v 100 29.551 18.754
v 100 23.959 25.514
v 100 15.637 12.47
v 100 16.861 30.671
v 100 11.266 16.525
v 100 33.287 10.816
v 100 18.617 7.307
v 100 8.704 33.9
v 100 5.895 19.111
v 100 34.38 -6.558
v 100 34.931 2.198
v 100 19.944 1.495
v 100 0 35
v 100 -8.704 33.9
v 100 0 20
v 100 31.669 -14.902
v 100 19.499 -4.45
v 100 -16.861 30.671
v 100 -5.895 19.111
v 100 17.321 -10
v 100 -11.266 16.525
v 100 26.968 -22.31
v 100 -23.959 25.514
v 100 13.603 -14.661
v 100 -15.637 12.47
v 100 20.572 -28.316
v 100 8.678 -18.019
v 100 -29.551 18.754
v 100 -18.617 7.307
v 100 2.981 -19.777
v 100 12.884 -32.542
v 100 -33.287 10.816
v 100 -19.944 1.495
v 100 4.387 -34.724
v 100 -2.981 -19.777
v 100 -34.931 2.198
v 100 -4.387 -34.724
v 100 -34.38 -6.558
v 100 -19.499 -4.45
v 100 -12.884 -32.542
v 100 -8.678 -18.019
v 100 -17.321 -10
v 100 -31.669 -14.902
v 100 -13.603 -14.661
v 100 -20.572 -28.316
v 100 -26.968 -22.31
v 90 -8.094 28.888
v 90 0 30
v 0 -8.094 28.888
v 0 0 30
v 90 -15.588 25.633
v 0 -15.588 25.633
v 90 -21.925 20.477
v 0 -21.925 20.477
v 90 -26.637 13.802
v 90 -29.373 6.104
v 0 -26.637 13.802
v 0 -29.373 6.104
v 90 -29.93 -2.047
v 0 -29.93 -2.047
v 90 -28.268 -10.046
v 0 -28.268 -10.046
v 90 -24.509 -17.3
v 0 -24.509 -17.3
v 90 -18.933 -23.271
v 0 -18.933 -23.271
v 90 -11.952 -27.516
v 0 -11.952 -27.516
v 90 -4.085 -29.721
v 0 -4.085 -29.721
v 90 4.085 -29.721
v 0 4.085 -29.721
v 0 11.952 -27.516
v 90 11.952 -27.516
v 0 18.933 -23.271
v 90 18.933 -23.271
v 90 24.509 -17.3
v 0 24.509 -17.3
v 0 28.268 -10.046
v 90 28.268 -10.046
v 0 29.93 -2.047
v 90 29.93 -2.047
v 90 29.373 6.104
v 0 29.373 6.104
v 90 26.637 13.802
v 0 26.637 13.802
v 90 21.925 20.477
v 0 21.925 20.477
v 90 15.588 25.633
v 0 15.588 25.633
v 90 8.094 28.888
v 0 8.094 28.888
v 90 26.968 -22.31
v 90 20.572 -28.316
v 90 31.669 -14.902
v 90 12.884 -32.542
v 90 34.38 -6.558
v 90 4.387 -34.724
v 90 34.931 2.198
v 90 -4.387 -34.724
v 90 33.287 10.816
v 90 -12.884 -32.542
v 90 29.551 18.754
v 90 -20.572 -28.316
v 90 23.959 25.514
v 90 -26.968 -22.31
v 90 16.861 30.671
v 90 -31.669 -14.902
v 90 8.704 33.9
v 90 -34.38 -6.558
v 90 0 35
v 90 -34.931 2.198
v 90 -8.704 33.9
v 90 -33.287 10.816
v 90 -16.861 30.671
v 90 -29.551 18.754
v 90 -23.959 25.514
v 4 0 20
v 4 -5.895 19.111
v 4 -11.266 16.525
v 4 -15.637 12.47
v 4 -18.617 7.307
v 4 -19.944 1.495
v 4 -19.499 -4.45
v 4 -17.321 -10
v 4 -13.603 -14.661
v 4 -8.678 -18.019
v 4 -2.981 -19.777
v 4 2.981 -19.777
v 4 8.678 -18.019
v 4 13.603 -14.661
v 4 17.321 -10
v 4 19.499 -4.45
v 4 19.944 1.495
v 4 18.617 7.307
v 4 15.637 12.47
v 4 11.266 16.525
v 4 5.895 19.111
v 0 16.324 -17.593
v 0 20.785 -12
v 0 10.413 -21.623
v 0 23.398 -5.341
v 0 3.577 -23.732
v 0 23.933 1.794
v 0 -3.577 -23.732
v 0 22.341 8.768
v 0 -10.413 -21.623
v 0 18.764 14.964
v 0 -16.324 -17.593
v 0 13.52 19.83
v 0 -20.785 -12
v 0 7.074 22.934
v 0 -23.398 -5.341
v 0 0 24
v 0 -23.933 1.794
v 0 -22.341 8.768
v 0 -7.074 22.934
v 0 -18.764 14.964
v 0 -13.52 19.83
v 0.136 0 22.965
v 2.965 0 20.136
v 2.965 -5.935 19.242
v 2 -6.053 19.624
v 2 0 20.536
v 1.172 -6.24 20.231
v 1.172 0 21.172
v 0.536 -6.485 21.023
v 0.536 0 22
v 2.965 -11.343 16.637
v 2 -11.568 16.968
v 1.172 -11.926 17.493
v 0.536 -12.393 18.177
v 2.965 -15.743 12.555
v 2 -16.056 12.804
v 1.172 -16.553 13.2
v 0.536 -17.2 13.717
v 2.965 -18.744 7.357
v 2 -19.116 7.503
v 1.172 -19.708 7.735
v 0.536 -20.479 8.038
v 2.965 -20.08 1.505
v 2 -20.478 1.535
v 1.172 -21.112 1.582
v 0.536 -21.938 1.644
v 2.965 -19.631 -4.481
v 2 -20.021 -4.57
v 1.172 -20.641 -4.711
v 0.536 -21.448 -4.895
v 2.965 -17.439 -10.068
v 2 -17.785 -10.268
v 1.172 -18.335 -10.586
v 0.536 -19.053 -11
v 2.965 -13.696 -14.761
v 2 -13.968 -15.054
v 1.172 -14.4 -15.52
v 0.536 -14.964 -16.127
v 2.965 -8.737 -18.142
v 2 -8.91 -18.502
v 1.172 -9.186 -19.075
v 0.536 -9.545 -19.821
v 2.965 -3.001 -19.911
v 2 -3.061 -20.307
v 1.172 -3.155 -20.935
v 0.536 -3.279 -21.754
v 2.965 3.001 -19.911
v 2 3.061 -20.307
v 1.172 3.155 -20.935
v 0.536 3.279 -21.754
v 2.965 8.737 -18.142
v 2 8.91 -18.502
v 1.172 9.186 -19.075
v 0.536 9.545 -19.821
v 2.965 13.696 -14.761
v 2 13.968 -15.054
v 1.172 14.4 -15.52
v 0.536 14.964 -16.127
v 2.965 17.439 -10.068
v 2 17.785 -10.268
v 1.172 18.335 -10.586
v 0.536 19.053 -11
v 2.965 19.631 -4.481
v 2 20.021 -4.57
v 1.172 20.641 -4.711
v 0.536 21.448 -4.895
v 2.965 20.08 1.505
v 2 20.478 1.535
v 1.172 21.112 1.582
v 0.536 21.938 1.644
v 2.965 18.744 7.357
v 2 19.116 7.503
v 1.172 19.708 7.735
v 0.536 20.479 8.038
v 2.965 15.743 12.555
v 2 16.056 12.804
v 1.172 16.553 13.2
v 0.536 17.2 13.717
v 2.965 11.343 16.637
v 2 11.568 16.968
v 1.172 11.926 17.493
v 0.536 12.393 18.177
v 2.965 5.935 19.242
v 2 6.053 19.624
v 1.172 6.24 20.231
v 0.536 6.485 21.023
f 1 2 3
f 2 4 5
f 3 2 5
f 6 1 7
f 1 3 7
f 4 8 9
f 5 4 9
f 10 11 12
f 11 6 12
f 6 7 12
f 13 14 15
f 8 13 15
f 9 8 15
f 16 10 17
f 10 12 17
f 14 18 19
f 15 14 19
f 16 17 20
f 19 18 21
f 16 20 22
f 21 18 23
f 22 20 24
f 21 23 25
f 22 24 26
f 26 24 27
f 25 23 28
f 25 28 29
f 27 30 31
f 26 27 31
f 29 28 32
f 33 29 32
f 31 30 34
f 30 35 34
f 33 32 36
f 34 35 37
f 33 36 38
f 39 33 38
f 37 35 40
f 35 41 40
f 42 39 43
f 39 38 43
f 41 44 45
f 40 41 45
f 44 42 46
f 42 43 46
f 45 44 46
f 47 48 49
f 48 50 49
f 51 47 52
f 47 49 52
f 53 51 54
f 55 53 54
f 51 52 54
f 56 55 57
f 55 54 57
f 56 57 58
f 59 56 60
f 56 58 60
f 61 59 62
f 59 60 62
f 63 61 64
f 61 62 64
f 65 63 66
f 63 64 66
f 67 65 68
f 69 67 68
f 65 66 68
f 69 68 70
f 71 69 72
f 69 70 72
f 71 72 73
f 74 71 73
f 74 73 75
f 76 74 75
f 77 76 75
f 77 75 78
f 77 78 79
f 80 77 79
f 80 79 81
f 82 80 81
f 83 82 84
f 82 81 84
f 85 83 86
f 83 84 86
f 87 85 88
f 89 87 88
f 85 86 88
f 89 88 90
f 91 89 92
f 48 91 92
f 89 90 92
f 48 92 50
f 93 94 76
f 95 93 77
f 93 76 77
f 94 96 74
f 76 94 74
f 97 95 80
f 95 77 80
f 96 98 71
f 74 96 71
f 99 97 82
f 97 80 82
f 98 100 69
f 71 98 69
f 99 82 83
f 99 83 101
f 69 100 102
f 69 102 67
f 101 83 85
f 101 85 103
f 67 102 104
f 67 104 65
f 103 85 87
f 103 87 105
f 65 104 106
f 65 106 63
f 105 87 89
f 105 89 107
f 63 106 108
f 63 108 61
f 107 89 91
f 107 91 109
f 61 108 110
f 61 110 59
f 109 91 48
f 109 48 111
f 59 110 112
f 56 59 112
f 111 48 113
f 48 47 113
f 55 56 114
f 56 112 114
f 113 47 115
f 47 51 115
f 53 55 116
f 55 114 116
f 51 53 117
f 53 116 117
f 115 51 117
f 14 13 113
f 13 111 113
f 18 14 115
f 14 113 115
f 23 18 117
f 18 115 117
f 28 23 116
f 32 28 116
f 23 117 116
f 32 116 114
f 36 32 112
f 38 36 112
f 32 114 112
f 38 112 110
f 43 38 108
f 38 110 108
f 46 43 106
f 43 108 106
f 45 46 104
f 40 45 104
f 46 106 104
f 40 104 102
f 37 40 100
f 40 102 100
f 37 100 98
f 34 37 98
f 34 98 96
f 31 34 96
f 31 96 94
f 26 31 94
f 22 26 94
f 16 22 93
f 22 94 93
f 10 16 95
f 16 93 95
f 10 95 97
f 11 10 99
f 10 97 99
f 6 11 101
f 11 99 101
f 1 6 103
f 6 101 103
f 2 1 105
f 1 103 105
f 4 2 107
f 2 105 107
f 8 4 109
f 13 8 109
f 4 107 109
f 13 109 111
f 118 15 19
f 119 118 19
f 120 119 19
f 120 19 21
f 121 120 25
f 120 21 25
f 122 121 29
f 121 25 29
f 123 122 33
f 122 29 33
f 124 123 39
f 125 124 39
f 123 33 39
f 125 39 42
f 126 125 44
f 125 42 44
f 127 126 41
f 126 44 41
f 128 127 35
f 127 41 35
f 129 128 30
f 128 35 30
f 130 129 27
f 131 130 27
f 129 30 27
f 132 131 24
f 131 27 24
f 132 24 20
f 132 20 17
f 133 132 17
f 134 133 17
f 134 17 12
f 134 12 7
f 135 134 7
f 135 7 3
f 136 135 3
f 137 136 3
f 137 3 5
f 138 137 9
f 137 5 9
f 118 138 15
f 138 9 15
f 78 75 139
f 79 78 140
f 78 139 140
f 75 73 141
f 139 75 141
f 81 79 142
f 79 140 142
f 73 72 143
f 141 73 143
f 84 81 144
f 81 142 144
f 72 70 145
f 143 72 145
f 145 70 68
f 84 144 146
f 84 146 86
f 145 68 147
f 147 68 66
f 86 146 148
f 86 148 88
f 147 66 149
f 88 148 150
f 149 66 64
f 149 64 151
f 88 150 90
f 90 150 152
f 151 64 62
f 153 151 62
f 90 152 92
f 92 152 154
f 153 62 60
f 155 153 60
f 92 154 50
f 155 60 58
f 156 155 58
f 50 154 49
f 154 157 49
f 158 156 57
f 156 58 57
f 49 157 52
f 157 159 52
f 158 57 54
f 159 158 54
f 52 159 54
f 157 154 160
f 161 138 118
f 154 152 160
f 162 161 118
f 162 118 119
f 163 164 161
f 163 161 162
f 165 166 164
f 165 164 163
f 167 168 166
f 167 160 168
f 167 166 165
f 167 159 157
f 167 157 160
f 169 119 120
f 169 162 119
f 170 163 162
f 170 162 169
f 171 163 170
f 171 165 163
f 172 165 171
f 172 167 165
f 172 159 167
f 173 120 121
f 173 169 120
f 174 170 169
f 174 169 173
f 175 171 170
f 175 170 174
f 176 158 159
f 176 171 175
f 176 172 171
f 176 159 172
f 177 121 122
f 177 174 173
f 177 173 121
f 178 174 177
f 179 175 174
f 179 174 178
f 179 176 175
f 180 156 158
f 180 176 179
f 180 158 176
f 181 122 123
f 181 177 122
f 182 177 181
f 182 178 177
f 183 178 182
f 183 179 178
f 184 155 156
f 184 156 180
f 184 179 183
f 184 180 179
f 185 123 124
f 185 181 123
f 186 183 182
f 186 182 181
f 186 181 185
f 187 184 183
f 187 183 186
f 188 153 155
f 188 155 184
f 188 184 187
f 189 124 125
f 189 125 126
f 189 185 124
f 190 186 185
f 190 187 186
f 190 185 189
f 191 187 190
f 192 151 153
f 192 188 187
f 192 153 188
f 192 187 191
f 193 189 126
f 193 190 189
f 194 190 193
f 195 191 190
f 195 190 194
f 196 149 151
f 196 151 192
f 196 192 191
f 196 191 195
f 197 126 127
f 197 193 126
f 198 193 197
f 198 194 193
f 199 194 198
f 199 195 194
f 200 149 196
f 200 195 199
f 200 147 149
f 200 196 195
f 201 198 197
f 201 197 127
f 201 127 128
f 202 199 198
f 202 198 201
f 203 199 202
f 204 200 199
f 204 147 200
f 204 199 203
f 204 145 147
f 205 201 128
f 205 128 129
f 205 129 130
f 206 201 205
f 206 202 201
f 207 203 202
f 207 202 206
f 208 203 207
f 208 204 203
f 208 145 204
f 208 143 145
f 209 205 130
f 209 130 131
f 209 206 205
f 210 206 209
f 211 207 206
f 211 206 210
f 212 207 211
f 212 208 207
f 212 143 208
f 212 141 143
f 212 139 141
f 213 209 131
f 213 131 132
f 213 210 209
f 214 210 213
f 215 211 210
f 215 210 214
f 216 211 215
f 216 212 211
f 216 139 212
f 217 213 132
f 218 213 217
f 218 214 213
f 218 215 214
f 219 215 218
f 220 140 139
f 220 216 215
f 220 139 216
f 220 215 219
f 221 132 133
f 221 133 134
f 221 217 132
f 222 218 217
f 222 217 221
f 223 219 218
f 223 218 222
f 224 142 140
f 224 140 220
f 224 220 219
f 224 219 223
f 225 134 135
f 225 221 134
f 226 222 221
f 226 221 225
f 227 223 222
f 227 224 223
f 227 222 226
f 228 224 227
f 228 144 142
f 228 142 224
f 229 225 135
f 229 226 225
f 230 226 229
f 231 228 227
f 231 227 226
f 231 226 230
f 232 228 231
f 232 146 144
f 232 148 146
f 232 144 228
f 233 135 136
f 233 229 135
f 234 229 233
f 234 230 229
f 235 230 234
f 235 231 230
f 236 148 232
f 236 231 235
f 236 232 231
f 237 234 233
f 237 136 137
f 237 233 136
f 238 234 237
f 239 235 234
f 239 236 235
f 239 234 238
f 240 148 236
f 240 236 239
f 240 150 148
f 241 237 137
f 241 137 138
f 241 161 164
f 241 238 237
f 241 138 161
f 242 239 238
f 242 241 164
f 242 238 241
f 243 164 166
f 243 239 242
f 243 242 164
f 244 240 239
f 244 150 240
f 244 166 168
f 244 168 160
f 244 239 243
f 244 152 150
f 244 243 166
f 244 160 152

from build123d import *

# Parameters (mm, degrees)
FILLET1_R = 4


with BuildPart() as part:
    # Sketch1 → Revolve1 (revolve)
    with BuildSketch(Plane.XY, mode=Mode.PRIVATE) as revolve1_sk:
        Polygon((0, 20), (100, 20), (100, 30), (100, 35), (90, 35), (90, 30), (0, 30), align=None)
    revolve(revolve1_sk.sketch.rotate(Axis((0, 0, 0), (1, 0, 0)), 90), axis=Axis((0, 0, 0), (1, 0, 0)))

    # Fillet1
    fillet1_edges = [part.edges().sort_by_distance(p)[0] for p in [
        (0, 0, -20),
    ]]
    fillet(fillet1_edges, radius=FILLET1_R)


solid = part.part
